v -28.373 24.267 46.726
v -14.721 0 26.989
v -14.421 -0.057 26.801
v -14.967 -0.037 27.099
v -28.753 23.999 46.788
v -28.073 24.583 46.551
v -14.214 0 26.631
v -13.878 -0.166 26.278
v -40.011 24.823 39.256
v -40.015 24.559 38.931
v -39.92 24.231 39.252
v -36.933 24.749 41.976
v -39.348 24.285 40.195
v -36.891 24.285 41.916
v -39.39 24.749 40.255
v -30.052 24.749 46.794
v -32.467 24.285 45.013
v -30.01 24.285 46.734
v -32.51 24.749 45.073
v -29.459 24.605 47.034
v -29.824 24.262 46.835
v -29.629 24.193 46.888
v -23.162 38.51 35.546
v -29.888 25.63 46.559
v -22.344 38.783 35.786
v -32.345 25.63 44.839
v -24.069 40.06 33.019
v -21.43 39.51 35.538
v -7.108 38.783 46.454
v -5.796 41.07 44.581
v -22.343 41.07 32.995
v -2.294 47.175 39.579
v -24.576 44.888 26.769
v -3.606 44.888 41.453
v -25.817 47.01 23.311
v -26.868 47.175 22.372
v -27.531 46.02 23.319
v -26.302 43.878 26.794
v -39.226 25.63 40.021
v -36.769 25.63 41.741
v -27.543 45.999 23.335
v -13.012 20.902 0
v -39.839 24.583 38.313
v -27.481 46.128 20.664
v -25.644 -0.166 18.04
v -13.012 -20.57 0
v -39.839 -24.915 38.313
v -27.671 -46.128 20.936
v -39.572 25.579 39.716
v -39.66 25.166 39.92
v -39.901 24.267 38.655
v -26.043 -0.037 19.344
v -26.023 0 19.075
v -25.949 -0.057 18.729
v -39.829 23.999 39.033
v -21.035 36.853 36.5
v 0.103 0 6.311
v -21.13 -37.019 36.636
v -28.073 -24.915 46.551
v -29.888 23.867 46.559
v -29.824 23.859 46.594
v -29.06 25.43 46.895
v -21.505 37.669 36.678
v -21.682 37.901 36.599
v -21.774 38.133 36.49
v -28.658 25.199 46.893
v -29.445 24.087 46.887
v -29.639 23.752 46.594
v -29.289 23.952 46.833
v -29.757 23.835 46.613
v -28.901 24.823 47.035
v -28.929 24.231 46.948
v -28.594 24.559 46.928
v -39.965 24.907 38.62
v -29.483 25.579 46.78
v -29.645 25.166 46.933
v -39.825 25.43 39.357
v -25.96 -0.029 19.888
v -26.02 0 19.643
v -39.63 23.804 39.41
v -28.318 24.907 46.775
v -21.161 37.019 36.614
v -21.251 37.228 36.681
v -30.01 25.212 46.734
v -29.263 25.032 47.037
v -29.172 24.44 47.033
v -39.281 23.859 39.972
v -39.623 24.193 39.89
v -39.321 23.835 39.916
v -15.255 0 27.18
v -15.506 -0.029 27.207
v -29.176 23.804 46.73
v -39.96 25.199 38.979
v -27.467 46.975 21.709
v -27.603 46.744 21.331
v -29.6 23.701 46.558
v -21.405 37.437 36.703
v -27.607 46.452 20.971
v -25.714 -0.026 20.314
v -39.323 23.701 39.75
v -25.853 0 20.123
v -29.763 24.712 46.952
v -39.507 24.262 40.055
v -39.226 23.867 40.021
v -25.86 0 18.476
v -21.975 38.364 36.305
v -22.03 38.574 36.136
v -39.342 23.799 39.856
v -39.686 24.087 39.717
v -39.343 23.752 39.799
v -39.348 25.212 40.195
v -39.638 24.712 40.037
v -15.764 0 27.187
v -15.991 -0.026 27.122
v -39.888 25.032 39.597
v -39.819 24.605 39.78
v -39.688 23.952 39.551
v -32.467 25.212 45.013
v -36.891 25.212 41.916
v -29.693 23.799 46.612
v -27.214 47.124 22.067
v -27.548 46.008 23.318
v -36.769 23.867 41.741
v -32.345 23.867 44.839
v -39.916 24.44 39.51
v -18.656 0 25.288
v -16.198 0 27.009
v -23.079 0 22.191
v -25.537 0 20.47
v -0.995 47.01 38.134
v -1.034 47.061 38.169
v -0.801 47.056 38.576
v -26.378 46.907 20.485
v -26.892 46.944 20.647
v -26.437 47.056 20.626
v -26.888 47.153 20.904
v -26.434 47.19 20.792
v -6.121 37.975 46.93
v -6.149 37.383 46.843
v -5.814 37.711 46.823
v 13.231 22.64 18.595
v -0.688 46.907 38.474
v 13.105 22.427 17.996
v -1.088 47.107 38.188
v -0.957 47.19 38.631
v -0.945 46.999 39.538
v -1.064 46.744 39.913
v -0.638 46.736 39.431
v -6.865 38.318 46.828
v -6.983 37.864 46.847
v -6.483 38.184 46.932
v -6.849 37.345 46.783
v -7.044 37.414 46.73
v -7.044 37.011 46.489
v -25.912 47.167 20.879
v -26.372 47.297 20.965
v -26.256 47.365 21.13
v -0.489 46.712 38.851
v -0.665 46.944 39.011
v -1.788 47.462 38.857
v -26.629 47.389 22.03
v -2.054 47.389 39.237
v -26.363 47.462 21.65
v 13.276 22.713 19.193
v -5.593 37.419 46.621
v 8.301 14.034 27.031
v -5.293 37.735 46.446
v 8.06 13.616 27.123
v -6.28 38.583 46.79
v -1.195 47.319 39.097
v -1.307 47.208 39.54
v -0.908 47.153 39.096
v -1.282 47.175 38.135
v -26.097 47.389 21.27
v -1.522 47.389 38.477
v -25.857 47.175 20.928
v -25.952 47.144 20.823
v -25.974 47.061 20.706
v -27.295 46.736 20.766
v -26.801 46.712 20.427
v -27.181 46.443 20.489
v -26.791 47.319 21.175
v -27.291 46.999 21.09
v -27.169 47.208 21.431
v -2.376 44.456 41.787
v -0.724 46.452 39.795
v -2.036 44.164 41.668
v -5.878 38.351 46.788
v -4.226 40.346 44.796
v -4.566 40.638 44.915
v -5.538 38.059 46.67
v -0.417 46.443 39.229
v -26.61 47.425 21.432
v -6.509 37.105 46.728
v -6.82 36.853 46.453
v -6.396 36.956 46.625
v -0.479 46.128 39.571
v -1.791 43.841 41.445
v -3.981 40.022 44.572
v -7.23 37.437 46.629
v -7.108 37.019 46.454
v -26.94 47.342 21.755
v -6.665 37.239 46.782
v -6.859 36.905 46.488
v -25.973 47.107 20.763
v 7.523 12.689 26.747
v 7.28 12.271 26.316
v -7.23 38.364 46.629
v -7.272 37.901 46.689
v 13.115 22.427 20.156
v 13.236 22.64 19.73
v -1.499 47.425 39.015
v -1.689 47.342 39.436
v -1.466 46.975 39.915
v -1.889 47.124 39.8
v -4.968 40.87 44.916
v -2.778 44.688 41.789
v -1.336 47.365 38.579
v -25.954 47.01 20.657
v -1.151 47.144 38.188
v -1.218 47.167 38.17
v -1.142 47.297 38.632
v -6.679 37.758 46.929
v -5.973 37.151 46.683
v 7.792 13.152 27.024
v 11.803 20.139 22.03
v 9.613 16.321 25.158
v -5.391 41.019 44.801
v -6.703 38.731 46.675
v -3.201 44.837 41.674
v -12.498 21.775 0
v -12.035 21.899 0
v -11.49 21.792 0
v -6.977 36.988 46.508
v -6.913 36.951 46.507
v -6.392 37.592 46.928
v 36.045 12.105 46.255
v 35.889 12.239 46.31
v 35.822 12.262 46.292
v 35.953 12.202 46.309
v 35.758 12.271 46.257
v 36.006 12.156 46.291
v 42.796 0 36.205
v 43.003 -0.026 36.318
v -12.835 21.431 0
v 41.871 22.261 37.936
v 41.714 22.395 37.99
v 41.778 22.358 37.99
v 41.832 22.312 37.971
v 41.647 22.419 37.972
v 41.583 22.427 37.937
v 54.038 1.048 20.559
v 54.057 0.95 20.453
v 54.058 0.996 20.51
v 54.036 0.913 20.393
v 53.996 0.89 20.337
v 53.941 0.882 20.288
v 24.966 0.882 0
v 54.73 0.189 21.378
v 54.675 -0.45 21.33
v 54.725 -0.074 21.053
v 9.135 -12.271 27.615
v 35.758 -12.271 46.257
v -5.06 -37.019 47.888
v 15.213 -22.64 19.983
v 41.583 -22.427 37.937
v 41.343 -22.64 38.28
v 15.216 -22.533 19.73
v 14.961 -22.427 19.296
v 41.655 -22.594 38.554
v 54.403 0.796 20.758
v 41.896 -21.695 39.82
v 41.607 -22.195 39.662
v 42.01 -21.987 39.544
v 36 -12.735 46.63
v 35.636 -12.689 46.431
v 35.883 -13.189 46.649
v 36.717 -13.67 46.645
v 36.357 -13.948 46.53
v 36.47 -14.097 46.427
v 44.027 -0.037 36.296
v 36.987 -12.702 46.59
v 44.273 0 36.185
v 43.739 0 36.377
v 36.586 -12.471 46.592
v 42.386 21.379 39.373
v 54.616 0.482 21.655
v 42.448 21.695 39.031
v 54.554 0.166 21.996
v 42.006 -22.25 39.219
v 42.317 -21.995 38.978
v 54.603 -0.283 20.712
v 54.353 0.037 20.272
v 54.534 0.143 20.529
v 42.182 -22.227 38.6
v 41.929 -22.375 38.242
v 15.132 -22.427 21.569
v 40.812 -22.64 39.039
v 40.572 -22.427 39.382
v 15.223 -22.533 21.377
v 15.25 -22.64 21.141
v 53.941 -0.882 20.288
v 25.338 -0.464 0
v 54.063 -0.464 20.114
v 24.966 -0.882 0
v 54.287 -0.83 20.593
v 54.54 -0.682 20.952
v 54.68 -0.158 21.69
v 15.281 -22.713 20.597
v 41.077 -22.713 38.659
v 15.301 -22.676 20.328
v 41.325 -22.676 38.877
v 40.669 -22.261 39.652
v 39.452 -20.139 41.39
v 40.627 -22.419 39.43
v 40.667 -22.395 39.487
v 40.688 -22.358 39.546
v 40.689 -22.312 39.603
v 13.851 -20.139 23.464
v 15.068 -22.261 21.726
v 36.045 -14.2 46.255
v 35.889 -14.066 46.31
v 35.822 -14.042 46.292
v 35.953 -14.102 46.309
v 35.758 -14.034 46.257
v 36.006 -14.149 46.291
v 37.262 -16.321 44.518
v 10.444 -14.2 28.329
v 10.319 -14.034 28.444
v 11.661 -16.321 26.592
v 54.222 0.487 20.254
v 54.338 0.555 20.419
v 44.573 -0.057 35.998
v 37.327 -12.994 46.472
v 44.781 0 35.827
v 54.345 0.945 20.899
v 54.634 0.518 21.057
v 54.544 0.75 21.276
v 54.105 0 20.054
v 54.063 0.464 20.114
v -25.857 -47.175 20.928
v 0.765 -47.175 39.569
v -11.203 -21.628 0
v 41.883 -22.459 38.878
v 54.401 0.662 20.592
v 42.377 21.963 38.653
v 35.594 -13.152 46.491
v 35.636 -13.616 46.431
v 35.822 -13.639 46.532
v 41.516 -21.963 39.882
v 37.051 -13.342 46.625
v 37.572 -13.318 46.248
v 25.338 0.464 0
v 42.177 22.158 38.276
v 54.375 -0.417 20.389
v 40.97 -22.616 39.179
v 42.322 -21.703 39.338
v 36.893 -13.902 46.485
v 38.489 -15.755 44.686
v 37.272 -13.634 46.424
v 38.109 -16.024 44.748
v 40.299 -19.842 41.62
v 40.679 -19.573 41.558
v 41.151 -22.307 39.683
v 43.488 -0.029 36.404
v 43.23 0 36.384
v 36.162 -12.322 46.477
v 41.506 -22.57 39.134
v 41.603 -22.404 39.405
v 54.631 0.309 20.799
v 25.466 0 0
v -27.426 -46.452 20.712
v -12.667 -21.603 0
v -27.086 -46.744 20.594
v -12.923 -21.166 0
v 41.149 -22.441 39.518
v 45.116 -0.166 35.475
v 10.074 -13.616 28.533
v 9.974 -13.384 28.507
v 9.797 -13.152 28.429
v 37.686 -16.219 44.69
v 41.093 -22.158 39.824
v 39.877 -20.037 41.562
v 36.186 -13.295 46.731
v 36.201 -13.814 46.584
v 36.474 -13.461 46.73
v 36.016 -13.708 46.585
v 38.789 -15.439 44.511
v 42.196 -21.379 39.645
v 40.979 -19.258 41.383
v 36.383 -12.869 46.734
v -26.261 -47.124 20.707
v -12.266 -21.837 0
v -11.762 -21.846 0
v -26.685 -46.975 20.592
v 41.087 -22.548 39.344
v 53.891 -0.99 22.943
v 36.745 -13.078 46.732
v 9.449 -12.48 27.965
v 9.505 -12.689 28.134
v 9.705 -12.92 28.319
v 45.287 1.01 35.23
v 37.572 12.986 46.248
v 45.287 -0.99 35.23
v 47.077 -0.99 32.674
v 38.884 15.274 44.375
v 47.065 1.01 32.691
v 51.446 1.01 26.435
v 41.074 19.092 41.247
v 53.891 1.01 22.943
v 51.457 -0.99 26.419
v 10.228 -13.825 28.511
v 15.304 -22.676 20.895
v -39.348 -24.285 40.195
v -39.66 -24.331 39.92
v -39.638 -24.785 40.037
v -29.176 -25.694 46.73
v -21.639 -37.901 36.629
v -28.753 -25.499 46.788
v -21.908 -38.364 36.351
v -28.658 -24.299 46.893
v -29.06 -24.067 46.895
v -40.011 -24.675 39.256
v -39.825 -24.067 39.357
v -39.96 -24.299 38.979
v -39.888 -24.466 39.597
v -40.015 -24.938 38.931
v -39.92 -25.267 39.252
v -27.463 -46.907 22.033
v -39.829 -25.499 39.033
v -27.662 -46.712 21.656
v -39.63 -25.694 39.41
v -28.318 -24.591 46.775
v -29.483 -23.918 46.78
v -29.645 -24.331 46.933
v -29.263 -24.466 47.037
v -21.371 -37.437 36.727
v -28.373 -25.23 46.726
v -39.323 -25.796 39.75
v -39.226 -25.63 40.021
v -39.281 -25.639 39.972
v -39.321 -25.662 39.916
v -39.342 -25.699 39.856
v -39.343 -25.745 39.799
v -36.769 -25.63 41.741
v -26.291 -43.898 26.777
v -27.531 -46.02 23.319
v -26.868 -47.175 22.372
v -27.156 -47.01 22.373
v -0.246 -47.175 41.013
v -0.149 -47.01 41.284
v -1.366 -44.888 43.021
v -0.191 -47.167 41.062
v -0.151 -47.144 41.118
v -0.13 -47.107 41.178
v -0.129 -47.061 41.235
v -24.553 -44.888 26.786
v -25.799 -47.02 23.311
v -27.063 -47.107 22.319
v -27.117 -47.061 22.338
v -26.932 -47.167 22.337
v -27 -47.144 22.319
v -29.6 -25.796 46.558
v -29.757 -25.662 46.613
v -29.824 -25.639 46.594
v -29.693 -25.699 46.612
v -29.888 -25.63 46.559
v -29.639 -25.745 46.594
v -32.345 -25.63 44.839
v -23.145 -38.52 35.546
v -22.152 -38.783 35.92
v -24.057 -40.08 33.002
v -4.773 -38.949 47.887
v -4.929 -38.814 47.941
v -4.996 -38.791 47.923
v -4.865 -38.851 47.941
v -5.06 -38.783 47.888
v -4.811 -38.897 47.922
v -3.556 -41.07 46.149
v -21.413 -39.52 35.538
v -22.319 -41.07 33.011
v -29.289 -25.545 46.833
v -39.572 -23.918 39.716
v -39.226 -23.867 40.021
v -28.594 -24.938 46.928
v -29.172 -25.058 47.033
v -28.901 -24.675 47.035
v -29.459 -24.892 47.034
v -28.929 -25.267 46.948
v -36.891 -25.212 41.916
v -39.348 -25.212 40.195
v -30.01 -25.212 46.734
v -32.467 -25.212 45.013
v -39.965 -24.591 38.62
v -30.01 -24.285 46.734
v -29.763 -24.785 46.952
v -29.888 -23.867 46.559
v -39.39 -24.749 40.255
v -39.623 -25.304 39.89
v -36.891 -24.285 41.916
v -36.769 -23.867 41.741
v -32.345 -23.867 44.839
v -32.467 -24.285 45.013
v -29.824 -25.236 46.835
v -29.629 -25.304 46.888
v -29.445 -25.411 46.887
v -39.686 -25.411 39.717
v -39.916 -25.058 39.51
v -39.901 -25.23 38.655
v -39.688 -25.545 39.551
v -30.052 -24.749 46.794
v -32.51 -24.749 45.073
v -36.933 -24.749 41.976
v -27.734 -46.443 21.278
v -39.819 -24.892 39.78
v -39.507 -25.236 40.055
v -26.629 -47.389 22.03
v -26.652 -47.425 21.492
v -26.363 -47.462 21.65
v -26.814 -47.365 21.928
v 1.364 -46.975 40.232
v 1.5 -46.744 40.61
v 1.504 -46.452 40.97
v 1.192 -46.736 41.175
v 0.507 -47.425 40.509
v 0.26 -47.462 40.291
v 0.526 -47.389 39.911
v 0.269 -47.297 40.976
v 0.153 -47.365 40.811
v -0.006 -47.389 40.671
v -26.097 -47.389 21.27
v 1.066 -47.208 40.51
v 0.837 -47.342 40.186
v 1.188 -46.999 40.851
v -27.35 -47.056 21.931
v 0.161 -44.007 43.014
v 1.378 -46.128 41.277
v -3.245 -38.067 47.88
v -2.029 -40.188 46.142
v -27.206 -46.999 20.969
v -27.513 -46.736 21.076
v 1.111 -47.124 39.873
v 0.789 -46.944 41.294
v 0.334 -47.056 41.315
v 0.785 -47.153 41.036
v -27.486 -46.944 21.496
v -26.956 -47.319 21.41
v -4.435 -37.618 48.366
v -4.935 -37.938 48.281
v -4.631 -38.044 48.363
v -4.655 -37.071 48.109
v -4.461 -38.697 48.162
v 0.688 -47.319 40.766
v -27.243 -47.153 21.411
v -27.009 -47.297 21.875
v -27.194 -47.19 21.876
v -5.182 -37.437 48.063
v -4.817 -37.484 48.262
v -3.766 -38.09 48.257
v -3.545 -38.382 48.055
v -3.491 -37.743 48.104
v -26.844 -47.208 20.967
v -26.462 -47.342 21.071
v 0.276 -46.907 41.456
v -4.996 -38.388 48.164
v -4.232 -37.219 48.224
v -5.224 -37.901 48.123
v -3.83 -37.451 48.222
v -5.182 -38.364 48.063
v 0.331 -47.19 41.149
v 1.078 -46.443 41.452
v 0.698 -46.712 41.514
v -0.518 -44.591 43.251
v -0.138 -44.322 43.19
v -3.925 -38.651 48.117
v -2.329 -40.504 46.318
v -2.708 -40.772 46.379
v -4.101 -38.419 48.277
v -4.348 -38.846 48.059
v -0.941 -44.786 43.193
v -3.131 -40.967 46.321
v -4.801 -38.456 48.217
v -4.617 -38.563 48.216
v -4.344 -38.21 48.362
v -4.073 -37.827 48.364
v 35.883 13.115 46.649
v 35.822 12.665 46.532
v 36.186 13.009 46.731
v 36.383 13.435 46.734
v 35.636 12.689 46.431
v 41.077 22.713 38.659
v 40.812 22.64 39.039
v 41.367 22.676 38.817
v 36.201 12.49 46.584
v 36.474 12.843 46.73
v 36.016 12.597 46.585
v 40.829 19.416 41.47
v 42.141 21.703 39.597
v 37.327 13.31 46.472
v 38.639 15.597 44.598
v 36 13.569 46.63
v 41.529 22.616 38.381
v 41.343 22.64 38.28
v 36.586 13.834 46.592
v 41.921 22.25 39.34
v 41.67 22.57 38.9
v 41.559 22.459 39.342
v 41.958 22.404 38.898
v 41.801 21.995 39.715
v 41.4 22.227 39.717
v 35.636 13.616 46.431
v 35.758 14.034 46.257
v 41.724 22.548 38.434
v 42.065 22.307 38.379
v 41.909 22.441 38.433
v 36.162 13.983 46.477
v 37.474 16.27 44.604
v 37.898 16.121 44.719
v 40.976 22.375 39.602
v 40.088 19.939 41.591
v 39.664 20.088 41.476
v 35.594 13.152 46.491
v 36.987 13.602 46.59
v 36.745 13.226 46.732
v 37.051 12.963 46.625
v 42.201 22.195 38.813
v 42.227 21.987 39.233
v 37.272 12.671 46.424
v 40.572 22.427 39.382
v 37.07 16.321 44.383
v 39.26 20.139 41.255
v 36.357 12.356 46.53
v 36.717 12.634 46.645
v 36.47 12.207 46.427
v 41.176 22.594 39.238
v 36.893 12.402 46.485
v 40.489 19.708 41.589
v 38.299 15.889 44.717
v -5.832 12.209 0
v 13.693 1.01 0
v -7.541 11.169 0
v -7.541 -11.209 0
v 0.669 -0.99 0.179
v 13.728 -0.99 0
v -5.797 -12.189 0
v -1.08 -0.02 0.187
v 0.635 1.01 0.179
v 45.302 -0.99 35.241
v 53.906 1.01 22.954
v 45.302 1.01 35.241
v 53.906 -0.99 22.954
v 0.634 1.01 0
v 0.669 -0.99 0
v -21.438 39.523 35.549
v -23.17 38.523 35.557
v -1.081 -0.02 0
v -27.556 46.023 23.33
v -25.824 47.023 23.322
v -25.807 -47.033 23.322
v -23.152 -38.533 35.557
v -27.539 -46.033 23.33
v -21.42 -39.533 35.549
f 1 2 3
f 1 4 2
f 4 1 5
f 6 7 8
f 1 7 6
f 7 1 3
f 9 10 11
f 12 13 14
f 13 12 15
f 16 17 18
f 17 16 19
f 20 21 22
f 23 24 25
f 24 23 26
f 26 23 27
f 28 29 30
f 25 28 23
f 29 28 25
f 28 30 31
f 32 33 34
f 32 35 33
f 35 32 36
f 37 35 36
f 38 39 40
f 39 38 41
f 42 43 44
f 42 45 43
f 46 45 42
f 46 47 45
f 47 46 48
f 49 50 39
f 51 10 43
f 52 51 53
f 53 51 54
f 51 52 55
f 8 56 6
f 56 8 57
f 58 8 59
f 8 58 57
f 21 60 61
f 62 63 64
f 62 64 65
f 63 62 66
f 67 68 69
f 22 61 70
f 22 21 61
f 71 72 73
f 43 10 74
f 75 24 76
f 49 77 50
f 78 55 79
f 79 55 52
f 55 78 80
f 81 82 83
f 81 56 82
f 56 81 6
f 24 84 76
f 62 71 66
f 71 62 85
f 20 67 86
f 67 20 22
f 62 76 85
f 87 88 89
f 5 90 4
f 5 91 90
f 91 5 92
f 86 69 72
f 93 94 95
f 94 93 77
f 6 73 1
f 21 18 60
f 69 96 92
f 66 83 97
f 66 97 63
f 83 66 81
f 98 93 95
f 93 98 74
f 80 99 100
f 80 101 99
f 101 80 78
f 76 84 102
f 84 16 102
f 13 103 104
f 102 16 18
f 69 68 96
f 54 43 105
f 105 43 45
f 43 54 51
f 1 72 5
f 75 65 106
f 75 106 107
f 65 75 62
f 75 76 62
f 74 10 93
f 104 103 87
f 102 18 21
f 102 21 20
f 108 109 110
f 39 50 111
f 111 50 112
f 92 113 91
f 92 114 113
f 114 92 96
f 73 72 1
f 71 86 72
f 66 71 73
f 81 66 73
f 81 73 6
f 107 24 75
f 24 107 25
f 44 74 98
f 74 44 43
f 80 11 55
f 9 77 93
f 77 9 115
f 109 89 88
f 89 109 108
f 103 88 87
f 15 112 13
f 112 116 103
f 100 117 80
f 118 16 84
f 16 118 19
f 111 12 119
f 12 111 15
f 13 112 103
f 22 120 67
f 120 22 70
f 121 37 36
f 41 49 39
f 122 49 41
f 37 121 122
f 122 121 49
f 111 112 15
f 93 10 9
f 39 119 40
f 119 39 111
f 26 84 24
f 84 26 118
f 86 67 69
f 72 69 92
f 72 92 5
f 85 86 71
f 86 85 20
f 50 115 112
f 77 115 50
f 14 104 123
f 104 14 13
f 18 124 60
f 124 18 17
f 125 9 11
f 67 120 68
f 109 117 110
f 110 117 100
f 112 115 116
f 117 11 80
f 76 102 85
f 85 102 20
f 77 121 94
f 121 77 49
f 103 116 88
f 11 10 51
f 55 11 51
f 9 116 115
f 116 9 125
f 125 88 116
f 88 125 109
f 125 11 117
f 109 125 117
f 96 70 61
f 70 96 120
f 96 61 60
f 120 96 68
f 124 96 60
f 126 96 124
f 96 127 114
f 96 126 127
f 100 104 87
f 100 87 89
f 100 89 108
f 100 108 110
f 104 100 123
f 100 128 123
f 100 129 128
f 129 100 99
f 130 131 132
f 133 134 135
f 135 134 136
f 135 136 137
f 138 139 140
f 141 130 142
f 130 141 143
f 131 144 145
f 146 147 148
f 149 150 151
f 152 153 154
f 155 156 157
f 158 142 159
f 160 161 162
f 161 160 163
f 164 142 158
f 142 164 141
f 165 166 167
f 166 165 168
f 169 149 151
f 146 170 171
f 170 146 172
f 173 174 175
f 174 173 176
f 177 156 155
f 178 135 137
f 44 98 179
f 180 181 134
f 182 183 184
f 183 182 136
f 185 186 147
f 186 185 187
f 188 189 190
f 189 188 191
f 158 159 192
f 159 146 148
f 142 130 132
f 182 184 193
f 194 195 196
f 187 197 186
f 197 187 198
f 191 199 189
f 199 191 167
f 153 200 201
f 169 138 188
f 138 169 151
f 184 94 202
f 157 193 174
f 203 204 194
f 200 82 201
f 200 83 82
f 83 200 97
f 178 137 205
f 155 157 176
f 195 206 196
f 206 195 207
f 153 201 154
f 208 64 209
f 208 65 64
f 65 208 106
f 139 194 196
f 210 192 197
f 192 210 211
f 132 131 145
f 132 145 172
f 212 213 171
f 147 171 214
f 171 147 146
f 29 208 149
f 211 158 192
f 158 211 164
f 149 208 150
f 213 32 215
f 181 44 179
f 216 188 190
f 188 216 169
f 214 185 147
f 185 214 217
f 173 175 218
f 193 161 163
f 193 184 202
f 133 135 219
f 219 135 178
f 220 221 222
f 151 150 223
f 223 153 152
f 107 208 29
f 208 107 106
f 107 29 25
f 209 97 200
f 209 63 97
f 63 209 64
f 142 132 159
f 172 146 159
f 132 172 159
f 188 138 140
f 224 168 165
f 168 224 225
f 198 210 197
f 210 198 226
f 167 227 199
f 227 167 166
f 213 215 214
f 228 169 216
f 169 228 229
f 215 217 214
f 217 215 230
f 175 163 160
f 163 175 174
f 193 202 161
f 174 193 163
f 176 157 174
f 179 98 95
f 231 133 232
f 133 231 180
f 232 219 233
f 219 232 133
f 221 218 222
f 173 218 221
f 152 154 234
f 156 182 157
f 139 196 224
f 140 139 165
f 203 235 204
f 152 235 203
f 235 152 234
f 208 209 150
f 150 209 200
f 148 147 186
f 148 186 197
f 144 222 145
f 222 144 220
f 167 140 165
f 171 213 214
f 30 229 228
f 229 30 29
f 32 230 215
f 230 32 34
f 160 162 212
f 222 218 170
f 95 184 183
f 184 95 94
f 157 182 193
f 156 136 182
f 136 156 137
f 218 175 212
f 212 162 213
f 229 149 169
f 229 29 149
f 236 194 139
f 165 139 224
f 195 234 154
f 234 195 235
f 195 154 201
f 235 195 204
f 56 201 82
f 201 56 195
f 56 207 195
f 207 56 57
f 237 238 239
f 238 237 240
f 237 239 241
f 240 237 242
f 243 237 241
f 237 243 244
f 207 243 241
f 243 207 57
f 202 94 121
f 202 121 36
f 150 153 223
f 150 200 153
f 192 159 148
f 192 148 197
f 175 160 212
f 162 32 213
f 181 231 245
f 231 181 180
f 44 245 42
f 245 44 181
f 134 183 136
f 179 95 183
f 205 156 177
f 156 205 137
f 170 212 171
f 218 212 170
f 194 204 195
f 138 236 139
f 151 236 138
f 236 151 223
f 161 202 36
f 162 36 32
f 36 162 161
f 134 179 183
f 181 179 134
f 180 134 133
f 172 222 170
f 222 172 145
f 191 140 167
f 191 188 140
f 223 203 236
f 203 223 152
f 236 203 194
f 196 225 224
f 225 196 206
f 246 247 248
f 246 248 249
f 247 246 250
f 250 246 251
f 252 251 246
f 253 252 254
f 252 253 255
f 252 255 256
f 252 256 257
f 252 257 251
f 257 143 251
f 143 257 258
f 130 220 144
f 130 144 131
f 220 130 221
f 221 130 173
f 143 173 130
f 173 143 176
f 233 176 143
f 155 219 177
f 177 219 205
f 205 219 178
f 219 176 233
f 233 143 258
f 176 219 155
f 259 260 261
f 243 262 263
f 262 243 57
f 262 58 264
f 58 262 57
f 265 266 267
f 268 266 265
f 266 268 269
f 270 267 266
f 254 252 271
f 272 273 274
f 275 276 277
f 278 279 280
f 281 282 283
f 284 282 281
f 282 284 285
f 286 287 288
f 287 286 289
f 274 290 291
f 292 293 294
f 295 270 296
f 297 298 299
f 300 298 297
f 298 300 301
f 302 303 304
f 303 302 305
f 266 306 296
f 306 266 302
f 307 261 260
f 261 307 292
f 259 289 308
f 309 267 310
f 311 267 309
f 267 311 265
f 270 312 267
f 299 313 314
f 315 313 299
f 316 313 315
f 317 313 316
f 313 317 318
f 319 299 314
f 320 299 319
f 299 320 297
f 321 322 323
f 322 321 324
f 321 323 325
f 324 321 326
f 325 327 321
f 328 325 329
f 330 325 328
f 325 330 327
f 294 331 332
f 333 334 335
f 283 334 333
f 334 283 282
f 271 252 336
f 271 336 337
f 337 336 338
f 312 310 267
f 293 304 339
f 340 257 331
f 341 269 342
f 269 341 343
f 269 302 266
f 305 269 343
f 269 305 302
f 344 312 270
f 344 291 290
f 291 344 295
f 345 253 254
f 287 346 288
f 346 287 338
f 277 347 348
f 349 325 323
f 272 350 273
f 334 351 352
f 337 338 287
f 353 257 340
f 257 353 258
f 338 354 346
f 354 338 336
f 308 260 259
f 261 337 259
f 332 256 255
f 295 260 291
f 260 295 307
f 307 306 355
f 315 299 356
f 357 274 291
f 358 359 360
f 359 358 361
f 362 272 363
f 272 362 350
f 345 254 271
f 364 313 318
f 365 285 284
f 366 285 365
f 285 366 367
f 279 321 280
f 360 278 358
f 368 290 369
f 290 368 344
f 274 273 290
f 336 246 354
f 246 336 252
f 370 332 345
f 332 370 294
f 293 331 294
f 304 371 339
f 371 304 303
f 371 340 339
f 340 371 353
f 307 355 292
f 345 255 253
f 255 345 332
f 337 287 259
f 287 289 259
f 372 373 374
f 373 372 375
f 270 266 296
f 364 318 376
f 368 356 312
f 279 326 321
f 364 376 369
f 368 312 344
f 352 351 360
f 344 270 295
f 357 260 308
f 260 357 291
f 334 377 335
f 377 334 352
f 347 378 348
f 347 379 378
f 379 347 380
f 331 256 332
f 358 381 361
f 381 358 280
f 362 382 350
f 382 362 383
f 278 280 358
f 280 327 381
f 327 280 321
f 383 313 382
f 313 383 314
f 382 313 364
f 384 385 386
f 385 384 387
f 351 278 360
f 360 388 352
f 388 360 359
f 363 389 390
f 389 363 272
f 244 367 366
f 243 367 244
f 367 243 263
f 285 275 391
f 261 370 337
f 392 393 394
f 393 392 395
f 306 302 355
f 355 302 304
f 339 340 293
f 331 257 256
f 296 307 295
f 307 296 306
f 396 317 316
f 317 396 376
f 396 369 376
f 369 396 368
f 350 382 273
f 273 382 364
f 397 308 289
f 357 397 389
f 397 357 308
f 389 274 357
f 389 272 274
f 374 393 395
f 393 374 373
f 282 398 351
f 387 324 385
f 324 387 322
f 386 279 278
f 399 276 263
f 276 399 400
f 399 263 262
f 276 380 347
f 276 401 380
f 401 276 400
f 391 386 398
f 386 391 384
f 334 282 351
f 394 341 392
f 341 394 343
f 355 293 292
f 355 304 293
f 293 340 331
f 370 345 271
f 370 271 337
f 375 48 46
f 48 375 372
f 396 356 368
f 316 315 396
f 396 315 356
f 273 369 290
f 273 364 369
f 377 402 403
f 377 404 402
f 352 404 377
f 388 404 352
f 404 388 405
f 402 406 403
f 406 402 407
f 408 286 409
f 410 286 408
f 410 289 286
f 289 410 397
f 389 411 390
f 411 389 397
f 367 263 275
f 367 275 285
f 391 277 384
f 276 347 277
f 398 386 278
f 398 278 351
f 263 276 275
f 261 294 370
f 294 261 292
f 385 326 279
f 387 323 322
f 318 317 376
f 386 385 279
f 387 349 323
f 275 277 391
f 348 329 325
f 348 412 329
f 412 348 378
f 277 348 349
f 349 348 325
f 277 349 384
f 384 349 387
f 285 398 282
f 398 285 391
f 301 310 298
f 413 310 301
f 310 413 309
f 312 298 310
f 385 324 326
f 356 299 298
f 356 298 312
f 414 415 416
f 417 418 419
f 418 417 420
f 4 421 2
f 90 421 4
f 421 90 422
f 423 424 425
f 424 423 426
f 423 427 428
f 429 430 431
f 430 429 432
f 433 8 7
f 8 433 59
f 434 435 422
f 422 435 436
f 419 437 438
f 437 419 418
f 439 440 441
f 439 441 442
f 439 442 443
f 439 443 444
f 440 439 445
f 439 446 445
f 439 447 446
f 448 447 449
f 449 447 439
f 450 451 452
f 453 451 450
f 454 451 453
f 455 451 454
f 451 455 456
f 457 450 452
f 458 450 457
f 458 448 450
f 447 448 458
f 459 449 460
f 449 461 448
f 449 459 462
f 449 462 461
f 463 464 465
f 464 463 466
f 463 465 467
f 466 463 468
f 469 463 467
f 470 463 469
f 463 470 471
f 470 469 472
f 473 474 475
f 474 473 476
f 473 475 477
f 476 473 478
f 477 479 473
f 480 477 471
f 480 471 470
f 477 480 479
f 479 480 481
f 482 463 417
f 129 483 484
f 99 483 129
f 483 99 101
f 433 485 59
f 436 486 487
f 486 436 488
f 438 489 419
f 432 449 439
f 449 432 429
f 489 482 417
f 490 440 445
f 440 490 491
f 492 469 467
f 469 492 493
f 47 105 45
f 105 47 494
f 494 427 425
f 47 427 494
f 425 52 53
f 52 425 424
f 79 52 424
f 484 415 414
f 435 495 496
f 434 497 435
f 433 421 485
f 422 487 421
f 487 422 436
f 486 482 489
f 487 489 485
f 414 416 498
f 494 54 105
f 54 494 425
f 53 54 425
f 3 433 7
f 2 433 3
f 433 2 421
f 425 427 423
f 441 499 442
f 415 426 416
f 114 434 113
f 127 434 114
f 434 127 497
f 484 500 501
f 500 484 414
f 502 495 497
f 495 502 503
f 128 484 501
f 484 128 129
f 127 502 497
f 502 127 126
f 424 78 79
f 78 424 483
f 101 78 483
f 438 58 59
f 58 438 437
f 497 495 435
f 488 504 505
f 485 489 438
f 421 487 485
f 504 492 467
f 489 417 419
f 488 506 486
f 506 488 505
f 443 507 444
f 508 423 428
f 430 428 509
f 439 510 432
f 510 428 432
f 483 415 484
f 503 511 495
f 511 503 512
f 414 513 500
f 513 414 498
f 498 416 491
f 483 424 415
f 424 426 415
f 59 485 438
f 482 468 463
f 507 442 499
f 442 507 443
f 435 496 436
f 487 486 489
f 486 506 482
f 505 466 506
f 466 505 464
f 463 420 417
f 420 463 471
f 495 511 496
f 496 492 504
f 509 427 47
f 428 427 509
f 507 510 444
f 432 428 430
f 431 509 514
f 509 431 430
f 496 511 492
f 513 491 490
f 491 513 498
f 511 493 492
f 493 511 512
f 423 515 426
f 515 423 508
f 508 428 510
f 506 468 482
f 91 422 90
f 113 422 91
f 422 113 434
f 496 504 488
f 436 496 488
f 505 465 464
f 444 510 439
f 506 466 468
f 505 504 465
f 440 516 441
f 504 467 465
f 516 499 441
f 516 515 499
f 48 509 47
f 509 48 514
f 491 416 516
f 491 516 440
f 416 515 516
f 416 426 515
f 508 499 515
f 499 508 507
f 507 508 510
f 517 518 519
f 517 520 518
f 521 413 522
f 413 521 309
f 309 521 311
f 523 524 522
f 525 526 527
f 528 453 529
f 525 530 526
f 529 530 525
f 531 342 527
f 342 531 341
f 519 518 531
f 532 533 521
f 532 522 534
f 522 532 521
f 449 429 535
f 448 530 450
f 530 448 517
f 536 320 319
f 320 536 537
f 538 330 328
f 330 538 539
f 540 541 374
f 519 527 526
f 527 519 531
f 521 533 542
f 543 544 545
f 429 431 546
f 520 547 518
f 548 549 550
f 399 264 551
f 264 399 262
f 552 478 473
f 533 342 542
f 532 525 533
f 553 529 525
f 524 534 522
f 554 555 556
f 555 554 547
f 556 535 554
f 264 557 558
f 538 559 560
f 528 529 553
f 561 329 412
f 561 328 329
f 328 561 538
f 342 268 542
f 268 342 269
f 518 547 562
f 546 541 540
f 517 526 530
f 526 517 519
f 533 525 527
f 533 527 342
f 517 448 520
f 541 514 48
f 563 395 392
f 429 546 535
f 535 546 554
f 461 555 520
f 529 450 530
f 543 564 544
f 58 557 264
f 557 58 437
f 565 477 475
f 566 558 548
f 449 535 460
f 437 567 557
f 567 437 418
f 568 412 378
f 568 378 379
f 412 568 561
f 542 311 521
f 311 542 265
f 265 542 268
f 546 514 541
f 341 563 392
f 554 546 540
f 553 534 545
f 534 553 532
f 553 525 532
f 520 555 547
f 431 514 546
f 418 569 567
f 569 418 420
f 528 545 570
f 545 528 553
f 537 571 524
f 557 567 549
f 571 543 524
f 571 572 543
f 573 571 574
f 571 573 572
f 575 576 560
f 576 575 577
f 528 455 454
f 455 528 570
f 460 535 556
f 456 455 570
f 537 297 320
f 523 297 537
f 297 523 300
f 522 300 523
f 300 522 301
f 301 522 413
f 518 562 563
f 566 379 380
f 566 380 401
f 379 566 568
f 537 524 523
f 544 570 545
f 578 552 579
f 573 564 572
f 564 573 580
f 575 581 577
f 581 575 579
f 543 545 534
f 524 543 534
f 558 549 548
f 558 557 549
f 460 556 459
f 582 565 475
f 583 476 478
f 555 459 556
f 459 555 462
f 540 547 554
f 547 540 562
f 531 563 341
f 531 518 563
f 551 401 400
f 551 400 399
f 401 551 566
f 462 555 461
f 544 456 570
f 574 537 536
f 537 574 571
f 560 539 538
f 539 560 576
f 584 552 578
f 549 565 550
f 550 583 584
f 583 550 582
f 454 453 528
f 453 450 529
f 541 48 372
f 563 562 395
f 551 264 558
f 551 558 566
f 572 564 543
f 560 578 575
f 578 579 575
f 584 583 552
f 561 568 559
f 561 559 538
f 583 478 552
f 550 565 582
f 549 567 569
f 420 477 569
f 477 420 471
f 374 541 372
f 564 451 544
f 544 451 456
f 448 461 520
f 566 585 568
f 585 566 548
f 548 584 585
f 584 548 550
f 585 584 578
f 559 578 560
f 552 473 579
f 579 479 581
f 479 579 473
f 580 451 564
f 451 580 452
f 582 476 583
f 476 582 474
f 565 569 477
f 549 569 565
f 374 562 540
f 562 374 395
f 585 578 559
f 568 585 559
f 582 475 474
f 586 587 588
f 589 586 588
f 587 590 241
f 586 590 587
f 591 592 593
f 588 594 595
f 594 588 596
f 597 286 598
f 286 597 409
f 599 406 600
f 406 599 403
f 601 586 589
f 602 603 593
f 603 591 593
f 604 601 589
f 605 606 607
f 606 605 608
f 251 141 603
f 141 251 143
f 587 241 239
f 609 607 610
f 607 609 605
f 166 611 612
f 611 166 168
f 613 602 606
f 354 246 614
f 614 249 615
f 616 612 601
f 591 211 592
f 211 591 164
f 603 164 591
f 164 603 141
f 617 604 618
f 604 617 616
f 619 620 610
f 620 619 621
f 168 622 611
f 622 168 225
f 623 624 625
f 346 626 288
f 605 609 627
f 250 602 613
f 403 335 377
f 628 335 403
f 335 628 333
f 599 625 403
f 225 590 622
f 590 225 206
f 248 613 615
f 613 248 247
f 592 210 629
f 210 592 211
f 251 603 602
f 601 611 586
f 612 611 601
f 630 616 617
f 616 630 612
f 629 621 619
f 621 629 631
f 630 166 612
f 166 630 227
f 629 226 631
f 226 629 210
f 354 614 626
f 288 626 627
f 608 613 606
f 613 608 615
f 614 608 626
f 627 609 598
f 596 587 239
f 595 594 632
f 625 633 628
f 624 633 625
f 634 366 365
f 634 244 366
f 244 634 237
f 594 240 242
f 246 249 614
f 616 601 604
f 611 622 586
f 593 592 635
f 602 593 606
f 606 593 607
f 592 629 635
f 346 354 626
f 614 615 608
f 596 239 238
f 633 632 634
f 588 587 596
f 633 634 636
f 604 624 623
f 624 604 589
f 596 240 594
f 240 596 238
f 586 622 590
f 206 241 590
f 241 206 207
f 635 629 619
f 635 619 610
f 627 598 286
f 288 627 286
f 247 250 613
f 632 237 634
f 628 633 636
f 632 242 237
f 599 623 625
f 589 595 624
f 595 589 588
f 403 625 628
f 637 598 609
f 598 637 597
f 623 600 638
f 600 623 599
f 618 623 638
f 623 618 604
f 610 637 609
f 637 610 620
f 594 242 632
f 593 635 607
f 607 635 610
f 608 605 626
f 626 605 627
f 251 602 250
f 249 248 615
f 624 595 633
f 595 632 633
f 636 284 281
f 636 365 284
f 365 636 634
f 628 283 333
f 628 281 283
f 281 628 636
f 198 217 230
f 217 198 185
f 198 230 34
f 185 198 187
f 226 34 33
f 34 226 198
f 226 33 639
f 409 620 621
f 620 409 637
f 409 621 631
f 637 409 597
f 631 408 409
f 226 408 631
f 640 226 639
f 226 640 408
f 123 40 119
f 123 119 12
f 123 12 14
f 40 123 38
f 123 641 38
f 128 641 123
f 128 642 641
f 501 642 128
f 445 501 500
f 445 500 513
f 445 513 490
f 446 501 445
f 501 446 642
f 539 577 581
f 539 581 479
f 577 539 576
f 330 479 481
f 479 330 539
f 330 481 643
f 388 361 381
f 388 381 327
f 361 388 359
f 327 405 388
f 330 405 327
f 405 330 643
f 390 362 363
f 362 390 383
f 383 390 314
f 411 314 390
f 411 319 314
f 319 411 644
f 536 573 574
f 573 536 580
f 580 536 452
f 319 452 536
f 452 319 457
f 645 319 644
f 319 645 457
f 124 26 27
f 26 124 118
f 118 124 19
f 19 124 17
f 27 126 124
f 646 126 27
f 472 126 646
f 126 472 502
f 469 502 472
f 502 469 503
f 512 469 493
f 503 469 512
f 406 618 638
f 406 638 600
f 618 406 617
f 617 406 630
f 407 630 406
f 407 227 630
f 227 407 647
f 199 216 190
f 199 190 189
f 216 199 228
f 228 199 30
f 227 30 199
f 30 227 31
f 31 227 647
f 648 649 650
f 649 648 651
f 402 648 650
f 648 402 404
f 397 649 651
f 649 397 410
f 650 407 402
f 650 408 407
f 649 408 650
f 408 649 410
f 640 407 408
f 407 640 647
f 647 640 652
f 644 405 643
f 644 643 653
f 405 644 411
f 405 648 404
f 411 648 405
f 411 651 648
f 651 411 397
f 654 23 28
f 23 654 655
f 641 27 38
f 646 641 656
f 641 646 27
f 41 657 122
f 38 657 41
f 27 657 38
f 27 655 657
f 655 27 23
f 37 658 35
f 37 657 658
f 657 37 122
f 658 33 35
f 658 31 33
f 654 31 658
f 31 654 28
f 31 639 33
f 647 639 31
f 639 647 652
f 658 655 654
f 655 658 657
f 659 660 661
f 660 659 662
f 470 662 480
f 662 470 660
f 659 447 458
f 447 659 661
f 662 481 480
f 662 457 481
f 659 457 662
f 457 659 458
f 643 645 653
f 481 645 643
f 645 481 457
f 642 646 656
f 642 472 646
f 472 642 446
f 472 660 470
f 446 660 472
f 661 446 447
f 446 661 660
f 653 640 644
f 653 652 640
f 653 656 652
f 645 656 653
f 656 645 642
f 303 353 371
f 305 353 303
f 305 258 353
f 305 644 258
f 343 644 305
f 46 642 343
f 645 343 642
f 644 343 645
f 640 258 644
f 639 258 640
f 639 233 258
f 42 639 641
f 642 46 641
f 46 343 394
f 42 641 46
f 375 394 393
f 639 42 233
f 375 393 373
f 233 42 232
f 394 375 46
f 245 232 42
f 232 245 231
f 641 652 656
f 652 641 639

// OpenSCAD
/*
 * Base Tiles - Parameterized Corners
 *
 * By Craig Wood
 *
 * Copyright 2020 Craig Wood - http://github.com/w3ace
 * This program is free software: you can redistribute it and/or modify
 * it under the terms of the GNU General Public License as published by
 * the Free Software Foundation, either version 3 of the License, or
 * (at your option) any later version.
 *
 * This program is distributed in thehope that it will be useful,
 * but WITHOUT ANY WARRANTY; without even the implied warranty of
 * MERCHANTABILITY or FITNESS FOR A PARTICULAR PURPOSE.  See the
 * GNU General Public License for more details.
 *
 * See <http://www.gnu.org/licenses/>.
 *
*/

$fn=20;

length = 65;
height = 30;
channel = 5.4;
wallwidth = 3;
supportwidth = 2;

width = channel+wallwidth*2;

cham = 3;


corner_bracket ();


module corner_bracket () {

	difference () {
		// Rotated Corner Bracket
		translate([0,0,-16])
			rotate([45,325,0])
				union () {
					difference () {
						minkowski () {
							frame();
							sphere(d=cham);
						}
						channels();
					}
					supports();
				}
		// Plane Cut Cube to Crop Corner
		translate([0,0,-20])
			cube([60,60,40],center=true);
	}
}


module frame () {
	cube([length,width,height],center=false);
	translate([width,0,0])
		rotate([0,0,90])
			cube([length,width,height],center=false);		
	translate([0,0,width])
		rotate([270,0,0])
			cube([length,width,height],center=false);		
	rotate([90,0,90])
		cube([length,width,height],center=false);	
	translate([length/2,0,0])
		rotate([0,270,0])
			cube([length,width,height],center=false);		
		rotate([0,270,270])
			cube([length,width,height],center=false);	
}


module channels () { 

	translate([wallwidth,wallwidth,wallwidth])
		cube([length,channel,length]);
	translate([width,0,0])
		rotate([0,0,90])
			translate([wallwidth,wallwidth,wallwidth])
				cube([length,channel,length]);
	translate([0,0,width])
		rotate([270,0,0])		
			translate([wallwidth,wallwidth,wallwidth])
				cube([length,channel,length]);
	rotate([90,0,90])		
		translate([wallwidth,wallwidth,wallwidth])
			cube([length,channel,length]);
}


module supports () {

	translate([9,0,supportwidth*.7])
		rotate([-45,0,0])
			cube([length-9+cham/2,supportwidth,15]);
	translate([supportwidth*.70,0])
		rotate([45,0,90])	
			translate([9,0,0])
			cube([length-9+cham/2,supportwidth,15]);
	translate([0,supportwidth*.7,0])
		rotate([225,270,0])	
			translate([9,0,0])
			cube([length-9+cham/2,supportwidth,15]);
}
